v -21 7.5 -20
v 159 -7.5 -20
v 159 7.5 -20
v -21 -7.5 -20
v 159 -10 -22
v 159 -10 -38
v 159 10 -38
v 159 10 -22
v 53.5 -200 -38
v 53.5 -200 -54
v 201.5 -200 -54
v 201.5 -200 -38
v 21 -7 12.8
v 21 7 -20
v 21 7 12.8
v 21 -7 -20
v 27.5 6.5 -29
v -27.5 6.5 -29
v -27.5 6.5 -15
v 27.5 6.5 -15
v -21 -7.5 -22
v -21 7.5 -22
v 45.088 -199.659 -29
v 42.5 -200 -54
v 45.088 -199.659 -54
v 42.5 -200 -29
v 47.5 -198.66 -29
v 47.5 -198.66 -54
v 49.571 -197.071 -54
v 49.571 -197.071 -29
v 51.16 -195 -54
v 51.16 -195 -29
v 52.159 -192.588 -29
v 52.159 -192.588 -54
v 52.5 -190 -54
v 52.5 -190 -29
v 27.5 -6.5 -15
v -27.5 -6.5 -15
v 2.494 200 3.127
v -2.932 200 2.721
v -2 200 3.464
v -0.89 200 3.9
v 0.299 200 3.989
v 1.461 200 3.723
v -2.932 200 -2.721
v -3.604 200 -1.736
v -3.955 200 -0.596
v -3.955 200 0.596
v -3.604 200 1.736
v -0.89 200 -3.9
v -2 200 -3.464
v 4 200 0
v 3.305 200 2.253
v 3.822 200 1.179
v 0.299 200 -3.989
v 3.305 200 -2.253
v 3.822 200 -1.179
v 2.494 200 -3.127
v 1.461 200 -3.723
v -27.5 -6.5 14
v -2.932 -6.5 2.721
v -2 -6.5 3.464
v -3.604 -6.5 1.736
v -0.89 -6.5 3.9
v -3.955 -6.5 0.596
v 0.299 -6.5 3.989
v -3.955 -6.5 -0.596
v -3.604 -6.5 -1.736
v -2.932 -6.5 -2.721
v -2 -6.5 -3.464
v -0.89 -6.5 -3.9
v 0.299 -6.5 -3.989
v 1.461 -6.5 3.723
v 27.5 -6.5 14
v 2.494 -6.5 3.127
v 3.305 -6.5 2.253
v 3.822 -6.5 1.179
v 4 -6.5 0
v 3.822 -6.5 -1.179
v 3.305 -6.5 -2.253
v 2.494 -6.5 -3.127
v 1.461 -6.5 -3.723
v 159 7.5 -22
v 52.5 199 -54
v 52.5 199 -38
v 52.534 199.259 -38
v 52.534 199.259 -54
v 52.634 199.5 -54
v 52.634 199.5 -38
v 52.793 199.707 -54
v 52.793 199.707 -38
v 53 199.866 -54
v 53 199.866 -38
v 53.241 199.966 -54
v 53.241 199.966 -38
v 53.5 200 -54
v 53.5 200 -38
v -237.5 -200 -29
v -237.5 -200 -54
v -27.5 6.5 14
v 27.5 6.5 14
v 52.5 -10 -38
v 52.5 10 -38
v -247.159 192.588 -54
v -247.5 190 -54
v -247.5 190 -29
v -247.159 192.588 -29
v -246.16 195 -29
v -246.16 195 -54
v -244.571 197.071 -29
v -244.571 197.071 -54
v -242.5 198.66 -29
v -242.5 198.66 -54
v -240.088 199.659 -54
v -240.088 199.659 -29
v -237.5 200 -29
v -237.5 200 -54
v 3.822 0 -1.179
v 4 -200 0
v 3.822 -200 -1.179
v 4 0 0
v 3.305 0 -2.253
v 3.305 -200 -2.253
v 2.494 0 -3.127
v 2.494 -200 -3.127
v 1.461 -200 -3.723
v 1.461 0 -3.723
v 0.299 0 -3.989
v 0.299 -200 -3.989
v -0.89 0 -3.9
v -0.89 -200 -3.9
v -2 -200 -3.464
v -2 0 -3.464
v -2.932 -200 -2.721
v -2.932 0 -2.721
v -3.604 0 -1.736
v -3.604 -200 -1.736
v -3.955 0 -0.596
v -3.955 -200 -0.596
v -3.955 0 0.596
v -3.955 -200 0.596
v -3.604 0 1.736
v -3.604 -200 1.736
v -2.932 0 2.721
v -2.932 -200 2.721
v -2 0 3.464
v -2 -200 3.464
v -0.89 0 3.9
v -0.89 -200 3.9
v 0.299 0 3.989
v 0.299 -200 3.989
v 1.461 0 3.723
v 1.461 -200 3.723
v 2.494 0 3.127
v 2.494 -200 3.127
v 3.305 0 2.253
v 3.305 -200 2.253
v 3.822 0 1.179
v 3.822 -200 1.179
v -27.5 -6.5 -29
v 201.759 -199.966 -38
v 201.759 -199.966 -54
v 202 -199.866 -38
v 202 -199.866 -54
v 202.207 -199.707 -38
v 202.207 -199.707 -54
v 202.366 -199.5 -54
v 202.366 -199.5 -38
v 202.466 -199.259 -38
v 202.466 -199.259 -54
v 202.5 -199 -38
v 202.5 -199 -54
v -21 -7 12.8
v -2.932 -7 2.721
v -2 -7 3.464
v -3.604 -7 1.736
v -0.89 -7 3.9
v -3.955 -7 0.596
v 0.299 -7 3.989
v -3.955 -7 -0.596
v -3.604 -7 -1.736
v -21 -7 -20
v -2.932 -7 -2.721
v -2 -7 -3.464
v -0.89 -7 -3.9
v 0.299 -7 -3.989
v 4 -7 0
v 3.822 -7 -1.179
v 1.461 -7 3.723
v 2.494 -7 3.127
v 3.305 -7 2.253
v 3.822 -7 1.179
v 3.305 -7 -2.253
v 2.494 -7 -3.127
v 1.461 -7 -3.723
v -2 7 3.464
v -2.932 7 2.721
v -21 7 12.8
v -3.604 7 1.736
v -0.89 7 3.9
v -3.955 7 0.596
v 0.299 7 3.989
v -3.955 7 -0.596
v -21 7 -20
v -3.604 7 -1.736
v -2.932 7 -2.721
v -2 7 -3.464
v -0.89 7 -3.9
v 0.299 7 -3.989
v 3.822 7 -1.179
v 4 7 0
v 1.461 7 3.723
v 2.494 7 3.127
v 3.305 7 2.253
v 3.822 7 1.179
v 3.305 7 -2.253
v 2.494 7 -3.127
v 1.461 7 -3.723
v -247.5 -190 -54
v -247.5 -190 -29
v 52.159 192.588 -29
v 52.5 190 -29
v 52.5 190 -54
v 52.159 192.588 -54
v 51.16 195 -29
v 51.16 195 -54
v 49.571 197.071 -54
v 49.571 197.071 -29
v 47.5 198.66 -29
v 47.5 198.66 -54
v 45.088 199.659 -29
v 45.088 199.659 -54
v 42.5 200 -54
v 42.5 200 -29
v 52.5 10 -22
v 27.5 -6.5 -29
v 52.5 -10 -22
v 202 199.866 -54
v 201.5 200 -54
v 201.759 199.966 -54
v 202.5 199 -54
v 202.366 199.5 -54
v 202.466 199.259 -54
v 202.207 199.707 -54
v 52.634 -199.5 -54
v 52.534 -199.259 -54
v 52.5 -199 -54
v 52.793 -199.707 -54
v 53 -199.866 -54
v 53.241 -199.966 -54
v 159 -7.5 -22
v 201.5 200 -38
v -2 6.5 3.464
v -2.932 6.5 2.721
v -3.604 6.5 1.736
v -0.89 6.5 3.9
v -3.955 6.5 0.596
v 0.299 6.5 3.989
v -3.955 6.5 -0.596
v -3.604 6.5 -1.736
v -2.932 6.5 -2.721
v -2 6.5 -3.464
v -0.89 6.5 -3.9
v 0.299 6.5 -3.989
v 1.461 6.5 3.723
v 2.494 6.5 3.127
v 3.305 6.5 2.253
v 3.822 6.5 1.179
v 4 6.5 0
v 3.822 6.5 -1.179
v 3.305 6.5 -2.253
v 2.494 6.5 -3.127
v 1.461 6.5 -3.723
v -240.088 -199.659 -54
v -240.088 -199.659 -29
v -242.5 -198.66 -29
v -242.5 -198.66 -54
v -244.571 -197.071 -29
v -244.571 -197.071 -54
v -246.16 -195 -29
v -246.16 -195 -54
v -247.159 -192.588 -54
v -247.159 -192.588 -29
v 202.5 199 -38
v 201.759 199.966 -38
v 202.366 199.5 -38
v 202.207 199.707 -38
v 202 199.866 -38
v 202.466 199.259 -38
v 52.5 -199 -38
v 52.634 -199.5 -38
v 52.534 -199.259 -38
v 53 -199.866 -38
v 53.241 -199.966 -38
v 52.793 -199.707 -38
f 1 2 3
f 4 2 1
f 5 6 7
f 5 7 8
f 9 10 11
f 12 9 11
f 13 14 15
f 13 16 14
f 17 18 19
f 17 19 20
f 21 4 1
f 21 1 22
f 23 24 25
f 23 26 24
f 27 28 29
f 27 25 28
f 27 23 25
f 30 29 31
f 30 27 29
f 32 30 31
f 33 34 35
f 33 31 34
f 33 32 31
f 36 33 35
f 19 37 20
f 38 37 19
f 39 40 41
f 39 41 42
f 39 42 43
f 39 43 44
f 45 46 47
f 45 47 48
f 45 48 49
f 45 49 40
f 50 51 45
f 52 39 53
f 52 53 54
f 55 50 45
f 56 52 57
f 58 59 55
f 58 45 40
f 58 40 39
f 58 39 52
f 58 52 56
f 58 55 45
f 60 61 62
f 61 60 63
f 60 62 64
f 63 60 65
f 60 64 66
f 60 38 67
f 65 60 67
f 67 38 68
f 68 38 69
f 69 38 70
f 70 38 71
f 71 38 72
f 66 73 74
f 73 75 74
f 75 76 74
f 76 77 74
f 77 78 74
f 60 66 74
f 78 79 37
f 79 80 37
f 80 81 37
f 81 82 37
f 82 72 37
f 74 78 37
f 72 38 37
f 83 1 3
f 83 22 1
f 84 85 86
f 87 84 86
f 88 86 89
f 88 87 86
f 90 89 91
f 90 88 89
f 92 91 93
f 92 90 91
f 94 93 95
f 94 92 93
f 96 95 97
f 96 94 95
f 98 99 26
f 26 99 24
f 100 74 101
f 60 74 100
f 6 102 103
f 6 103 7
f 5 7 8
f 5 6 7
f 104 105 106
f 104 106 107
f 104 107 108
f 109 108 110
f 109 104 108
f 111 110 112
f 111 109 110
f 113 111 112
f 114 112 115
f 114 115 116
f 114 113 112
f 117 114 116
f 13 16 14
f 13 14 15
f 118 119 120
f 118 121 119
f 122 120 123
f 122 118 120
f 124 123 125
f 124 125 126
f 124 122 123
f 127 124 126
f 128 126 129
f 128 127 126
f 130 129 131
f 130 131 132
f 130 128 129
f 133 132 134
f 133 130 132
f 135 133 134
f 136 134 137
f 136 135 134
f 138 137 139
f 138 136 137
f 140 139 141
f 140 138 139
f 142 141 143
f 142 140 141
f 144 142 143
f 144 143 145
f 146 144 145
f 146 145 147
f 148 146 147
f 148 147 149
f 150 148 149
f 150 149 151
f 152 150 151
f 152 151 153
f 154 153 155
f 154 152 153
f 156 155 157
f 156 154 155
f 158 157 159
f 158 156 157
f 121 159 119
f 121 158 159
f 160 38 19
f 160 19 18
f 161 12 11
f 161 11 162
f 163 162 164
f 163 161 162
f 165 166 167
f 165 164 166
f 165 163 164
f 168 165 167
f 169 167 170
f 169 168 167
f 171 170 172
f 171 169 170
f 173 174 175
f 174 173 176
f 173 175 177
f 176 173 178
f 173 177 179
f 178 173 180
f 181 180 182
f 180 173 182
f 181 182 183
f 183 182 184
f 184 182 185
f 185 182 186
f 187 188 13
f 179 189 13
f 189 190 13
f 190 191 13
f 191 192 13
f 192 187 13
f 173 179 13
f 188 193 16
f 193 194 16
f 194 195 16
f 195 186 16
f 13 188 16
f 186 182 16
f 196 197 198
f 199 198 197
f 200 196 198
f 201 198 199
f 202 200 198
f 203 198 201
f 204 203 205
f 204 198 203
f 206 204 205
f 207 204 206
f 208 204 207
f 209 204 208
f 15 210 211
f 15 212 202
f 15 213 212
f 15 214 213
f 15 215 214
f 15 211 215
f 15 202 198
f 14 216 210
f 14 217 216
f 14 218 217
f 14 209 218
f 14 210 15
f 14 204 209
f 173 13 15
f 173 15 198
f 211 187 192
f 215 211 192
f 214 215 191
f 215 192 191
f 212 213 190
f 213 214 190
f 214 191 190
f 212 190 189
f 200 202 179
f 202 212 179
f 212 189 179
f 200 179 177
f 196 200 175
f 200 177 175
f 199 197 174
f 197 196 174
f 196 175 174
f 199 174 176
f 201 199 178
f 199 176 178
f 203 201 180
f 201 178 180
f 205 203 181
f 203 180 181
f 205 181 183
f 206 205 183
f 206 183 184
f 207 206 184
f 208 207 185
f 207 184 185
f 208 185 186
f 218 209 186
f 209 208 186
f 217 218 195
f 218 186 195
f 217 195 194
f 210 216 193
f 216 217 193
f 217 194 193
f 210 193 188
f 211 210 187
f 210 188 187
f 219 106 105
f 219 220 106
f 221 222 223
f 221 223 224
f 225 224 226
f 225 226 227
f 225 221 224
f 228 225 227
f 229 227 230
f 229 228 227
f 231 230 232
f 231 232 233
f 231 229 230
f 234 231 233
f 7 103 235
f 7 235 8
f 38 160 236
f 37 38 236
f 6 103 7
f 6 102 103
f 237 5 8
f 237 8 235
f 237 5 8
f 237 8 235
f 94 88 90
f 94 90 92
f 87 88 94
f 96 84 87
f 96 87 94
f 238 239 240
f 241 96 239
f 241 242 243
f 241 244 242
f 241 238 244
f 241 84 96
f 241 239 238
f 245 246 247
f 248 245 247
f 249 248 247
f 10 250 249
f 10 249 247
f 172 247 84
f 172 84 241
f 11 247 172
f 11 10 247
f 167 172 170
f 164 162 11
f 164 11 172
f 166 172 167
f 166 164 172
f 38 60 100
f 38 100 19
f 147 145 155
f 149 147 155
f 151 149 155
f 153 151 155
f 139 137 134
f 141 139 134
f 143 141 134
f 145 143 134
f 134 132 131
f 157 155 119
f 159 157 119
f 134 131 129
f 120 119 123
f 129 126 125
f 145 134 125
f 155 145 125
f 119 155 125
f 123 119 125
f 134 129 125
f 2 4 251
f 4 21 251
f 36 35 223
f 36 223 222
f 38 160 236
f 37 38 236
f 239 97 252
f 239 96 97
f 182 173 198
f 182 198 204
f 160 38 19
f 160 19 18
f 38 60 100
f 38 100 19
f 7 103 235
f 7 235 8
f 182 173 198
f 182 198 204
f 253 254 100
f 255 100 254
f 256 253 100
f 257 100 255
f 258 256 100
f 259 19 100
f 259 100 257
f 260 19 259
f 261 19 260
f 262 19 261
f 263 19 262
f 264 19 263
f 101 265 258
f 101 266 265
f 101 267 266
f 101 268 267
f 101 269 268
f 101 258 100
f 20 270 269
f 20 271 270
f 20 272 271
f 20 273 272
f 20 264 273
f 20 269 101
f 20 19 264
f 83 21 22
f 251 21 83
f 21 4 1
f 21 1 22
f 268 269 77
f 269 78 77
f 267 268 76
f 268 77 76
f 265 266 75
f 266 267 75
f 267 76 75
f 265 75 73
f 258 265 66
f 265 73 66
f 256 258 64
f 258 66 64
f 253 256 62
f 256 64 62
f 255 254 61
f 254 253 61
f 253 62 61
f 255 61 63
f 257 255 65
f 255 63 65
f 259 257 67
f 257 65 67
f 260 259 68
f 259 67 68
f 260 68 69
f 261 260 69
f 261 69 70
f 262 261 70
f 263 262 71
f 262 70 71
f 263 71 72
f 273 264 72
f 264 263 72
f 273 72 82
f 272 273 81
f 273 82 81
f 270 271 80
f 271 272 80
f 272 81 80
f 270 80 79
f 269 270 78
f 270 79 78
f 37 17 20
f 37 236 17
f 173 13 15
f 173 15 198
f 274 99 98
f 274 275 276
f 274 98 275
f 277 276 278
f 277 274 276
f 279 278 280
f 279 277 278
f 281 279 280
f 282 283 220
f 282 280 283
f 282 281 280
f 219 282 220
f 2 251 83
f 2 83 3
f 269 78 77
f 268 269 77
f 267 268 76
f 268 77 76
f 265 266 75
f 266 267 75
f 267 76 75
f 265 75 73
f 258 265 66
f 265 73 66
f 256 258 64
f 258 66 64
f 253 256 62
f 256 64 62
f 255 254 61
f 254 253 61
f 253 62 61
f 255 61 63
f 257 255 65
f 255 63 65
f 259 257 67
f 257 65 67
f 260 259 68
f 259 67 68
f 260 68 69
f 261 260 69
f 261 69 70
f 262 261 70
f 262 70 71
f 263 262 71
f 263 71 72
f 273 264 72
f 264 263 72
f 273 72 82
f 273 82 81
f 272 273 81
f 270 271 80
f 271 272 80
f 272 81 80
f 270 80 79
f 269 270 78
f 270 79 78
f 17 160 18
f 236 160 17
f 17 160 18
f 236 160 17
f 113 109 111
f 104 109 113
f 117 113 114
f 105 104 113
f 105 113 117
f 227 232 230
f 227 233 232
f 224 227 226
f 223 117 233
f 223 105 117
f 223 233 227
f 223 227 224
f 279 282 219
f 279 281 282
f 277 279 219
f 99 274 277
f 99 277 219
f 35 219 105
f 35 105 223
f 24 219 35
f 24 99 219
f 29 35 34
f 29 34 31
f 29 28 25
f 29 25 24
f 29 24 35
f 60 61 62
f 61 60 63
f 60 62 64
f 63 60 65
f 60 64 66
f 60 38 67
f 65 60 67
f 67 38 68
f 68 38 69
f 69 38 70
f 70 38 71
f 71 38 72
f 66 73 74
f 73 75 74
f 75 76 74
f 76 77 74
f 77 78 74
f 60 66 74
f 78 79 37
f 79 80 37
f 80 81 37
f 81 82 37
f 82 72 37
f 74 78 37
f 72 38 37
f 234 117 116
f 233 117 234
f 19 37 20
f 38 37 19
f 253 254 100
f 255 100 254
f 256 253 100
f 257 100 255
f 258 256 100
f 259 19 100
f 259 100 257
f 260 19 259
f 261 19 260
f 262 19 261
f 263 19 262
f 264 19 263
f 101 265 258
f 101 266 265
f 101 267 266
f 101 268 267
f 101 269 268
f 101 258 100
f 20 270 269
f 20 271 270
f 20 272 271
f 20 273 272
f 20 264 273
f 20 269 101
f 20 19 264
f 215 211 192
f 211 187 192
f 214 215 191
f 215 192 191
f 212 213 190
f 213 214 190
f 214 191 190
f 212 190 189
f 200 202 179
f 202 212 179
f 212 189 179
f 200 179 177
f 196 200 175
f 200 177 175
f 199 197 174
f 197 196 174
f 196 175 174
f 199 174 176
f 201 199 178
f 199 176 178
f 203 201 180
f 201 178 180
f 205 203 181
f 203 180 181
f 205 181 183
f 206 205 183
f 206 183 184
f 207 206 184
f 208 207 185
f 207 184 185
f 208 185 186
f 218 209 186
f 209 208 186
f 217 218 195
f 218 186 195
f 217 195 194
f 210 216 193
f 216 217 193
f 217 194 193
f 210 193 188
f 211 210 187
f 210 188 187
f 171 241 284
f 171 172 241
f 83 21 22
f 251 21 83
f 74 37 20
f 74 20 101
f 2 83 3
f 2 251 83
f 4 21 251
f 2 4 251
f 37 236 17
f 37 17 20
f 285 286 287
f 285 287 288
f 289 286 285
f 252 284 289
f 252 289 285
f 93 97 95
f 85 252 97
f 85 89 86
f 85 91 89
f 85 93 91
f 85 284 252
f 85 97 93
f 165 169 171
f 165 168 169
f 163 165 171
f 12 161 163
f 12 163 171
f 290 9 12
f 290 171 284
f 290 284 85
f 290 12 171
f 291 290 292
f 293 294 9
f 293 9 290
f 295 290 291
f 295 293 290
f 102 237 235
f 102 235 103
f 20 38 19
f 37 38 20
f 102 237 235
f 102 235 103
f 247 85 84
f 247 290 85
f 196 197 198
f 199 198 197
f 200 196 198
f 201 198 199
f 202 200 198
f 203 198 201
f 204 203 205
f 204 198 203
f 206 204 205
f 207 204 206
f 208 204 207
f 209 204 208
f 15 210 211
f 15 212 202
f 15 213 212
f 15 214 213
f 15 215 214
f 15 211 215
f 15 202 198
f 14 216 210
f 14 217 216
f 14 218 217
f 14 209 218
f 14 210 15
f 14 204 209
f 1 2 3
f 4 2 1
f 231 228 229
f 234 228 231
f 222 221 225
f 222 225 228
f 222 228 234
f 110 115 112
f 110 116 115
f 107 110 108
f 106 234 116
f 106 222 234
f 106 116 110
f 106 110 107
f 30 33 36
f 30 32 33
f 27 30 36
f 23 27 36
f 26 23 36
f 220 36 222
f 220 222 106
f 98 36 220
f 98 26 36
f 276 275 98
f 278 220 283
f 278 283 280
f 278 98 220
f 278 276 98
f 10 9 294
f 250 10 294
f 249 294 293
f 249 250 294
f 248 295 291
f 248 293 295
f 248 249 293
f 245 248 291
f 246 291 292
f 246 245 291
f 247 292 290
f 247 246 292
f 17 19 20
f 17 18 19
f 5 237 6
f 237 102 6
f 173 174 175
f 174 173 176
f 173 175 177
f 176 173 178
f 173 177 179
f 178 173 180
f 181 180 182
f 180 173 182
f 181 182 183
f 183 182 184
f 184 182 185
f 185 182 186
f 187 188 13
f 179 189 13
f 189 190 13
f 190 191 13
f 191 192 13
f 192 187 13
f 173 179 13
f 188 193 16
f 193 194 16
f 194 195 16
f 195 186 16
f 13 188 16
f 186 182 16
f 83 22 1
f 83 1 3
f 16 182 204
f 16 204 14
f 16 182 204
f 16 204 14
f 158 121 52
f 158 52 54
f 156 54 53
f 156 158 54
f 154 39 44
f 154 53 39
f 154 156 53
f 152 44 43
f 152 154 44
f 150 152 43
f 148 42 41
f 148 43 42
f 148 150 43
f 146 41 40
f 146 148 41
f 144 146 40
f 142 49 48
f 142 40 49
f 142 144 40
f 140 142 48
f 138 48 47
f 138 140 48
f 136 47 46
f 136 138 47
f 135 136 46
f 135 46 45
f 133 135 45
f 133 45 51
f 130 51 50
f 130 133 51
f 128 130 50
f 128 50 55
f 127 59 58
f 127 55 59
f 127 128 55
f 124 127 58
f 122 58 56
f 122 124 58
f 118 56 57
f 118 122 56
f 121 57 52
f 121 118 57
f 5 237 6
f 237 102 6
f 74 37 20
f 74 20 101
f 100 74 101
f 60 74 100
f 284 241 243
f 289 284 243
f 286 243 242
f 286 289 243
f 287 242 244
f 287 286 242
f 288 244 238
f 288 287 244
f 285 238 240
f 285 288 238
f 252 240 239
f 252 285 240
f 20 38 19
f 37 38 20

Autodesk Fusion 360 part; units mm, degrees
sketch "Sketch1" plane through (0, 0, 0) normal (0, 1, 0) x (1, 0, 0) in component "Base"
  line L0 (-247.5, 54) -> (52.5, 54)
  line L1 (52.5, 54) -> (52.5, 29)
  line L2 (52.5, 29) -> (-247.5, 29)
  line L3 (-247.5, 29) -> (-247.5, 54)
extrude "Extrude1" add sketch "Sketch1" along normal mid plane 400 makes body 1 in component "Base"
fillet "Fillet1" radius 10 4 edges at (-247.5, -200, -41.5) (52.5, -200, -41.5) (-247.5, 200, -41.5) (52.5, 200, -41.5) on bodies 1 in component "Base"
sketch "Sketch1 (2)" plane through (0, 0, 0) normal (0, 1, 0) x (1, 0, 0) in component "KP08"
  line L0 (-27.5, 15) -> (27.5, 15)
  line L1 (27.5, 15) -> (27.5, -14)
  line L2 (27.5, -14) -> (-27.5, -14)
  line L3 (-27.5, -14) -> (-27.5, 15)
  circle A0 centre (0, 0) radius 4
extrude "Extrude1'" add sketch "Sketch1 (2)" along normal mid plane 13 separate body makes body 2 in component "KP08"
sketch "Sketch2" plane through (0, 0, 0) normal (0, 1, 0) x (1, 0, 0) in component "KP08"
  line L0 (-27.5, 29) -> (27.5, 29)
  line L1 (27.5, 29) -> (27.5, 15)
  line L2 (27.5, 15) -> (-27.5, 15)
  line L3 (-27.5, 15) -> (-27.5, 29)
extrude "Extrude2" add sketch "Sketch2" along normal mid plane 13 separate body makes body 3 in component "KP08"
sketch "Sketch1 (3)" plane through (0, 0, 0) normal (0, 1, 0) x (1, 0, 0) in component "Swing"
  circle A0 centre (0, 0) radius 4
extrude "Extrude1''" add sketch "Sketch1 (3)" along normal mid plane 400 separate body makes body 4 in component "Swing"
sketch "Sketch2 (2)" plane through (0, 0, 0) normal (0, 1, 0) x (1, 0, 0) in component "Swing"
  line L0 (52.5, 54) -> (202.5, 54)
  line L1 (202.5, 54) -> (202.5, 38)
  line L2 (202.5, 38) -> (52.5, 38)
  line L3 (52.5, 38) -> (52.5, 54)
extrude "Extrude2'" add sketch "Sketch2 (2)" along normal mid plane 400 separate body makes body 5 in component "Swing"
fillet "Fillet1'" radius 1 4 edges at (52.5, -200, -46) (202.5, -200, -46) (52.5, 200, -46) (202.5, 200, -46) on bodies 5 in component "Swing"
sketch "Sketch1 (4)" plane through (0, 0, 0) normal (0, 1, 0) x (1, 0, 0) in component "SK8-hand-holder"
  line L0 (-21, 20) -> (21, 20)
  line L1 (21, 20) -> (21, -12.8)
  line L2 (21, -12.8) -> (-21, -12.8)
  line L3 (-21, -12.8) -> (-21, 20)
  circle A0 centre (0, 0) radius 4
extrude "Extrude1'''" add sketch "Sketch1 (4)" along normal mid plane 14 separate body makes body 6 in component "SK8-hand-holder"
sketch "Sketch2 (3)" plane through (0, 0, 0) normal (0, 1, 0) x (1, 0, 0) in component "SK8-hand-holder"
  line L0 (-21, 22) -> (159, 22)
  line L1 (159, 22) -> (159, 20)
  line L2 (159, 20) -> (-21, 20)
  line L3 (-21, 20) -> (-21, 22)
extrude "Extrude2''" add sketch "Sketch2 (3)" along normal mid plane 15 separate body makes body 7 in component "SK8-hand-holder"
sketch "Sketch3" plane through (0, 0, 0) normal (0, 1, 0) x (1, 0, 0) in component "SK8-hand-holder"
  line L0 (52.5, 38) -> (159, 38)
  line L1 (159, 38) -> (159, 22)
  line L2 (159, 22) -> (52.5, 22)
  line L3 (52.5, 22) -> (52.5, 38)
extrude "Extrude3" add sketch "Sketch3" along normal mid plane 20 separate body makes body 8 in component "SK8-hand-holder"
component "Base" placed x (1, 0, 0) y (0, 1, 0) z (0, 0, 1) at (0, 0, 0)
component "Swing" placed x (1, 0, 0) y (0, 1, 0) z (0, 0, 1) at (0, 0, 0)
component "KP08" placed x (1, 0, 0) y (0, 1, 0) z (0, 0, 1) at (0, 0, 0) in component "Base"
component "KP08" placed x (1, 0, 0) y (0, 1, 0) z (0, 0, 1) at (0, 0, 0) in component "Base"
component "SK8-hand-holder" placed x (1, 0, 0) y (0, 1, 0) z (0, 0, 1) at (0, 0, 0) in component "Swing"
component "SK8-hand-holder" placed x (1, 0, 0) y (0, 1, 0) z (0, 0, 1) at (0, 0, 0) in component "Swing"
